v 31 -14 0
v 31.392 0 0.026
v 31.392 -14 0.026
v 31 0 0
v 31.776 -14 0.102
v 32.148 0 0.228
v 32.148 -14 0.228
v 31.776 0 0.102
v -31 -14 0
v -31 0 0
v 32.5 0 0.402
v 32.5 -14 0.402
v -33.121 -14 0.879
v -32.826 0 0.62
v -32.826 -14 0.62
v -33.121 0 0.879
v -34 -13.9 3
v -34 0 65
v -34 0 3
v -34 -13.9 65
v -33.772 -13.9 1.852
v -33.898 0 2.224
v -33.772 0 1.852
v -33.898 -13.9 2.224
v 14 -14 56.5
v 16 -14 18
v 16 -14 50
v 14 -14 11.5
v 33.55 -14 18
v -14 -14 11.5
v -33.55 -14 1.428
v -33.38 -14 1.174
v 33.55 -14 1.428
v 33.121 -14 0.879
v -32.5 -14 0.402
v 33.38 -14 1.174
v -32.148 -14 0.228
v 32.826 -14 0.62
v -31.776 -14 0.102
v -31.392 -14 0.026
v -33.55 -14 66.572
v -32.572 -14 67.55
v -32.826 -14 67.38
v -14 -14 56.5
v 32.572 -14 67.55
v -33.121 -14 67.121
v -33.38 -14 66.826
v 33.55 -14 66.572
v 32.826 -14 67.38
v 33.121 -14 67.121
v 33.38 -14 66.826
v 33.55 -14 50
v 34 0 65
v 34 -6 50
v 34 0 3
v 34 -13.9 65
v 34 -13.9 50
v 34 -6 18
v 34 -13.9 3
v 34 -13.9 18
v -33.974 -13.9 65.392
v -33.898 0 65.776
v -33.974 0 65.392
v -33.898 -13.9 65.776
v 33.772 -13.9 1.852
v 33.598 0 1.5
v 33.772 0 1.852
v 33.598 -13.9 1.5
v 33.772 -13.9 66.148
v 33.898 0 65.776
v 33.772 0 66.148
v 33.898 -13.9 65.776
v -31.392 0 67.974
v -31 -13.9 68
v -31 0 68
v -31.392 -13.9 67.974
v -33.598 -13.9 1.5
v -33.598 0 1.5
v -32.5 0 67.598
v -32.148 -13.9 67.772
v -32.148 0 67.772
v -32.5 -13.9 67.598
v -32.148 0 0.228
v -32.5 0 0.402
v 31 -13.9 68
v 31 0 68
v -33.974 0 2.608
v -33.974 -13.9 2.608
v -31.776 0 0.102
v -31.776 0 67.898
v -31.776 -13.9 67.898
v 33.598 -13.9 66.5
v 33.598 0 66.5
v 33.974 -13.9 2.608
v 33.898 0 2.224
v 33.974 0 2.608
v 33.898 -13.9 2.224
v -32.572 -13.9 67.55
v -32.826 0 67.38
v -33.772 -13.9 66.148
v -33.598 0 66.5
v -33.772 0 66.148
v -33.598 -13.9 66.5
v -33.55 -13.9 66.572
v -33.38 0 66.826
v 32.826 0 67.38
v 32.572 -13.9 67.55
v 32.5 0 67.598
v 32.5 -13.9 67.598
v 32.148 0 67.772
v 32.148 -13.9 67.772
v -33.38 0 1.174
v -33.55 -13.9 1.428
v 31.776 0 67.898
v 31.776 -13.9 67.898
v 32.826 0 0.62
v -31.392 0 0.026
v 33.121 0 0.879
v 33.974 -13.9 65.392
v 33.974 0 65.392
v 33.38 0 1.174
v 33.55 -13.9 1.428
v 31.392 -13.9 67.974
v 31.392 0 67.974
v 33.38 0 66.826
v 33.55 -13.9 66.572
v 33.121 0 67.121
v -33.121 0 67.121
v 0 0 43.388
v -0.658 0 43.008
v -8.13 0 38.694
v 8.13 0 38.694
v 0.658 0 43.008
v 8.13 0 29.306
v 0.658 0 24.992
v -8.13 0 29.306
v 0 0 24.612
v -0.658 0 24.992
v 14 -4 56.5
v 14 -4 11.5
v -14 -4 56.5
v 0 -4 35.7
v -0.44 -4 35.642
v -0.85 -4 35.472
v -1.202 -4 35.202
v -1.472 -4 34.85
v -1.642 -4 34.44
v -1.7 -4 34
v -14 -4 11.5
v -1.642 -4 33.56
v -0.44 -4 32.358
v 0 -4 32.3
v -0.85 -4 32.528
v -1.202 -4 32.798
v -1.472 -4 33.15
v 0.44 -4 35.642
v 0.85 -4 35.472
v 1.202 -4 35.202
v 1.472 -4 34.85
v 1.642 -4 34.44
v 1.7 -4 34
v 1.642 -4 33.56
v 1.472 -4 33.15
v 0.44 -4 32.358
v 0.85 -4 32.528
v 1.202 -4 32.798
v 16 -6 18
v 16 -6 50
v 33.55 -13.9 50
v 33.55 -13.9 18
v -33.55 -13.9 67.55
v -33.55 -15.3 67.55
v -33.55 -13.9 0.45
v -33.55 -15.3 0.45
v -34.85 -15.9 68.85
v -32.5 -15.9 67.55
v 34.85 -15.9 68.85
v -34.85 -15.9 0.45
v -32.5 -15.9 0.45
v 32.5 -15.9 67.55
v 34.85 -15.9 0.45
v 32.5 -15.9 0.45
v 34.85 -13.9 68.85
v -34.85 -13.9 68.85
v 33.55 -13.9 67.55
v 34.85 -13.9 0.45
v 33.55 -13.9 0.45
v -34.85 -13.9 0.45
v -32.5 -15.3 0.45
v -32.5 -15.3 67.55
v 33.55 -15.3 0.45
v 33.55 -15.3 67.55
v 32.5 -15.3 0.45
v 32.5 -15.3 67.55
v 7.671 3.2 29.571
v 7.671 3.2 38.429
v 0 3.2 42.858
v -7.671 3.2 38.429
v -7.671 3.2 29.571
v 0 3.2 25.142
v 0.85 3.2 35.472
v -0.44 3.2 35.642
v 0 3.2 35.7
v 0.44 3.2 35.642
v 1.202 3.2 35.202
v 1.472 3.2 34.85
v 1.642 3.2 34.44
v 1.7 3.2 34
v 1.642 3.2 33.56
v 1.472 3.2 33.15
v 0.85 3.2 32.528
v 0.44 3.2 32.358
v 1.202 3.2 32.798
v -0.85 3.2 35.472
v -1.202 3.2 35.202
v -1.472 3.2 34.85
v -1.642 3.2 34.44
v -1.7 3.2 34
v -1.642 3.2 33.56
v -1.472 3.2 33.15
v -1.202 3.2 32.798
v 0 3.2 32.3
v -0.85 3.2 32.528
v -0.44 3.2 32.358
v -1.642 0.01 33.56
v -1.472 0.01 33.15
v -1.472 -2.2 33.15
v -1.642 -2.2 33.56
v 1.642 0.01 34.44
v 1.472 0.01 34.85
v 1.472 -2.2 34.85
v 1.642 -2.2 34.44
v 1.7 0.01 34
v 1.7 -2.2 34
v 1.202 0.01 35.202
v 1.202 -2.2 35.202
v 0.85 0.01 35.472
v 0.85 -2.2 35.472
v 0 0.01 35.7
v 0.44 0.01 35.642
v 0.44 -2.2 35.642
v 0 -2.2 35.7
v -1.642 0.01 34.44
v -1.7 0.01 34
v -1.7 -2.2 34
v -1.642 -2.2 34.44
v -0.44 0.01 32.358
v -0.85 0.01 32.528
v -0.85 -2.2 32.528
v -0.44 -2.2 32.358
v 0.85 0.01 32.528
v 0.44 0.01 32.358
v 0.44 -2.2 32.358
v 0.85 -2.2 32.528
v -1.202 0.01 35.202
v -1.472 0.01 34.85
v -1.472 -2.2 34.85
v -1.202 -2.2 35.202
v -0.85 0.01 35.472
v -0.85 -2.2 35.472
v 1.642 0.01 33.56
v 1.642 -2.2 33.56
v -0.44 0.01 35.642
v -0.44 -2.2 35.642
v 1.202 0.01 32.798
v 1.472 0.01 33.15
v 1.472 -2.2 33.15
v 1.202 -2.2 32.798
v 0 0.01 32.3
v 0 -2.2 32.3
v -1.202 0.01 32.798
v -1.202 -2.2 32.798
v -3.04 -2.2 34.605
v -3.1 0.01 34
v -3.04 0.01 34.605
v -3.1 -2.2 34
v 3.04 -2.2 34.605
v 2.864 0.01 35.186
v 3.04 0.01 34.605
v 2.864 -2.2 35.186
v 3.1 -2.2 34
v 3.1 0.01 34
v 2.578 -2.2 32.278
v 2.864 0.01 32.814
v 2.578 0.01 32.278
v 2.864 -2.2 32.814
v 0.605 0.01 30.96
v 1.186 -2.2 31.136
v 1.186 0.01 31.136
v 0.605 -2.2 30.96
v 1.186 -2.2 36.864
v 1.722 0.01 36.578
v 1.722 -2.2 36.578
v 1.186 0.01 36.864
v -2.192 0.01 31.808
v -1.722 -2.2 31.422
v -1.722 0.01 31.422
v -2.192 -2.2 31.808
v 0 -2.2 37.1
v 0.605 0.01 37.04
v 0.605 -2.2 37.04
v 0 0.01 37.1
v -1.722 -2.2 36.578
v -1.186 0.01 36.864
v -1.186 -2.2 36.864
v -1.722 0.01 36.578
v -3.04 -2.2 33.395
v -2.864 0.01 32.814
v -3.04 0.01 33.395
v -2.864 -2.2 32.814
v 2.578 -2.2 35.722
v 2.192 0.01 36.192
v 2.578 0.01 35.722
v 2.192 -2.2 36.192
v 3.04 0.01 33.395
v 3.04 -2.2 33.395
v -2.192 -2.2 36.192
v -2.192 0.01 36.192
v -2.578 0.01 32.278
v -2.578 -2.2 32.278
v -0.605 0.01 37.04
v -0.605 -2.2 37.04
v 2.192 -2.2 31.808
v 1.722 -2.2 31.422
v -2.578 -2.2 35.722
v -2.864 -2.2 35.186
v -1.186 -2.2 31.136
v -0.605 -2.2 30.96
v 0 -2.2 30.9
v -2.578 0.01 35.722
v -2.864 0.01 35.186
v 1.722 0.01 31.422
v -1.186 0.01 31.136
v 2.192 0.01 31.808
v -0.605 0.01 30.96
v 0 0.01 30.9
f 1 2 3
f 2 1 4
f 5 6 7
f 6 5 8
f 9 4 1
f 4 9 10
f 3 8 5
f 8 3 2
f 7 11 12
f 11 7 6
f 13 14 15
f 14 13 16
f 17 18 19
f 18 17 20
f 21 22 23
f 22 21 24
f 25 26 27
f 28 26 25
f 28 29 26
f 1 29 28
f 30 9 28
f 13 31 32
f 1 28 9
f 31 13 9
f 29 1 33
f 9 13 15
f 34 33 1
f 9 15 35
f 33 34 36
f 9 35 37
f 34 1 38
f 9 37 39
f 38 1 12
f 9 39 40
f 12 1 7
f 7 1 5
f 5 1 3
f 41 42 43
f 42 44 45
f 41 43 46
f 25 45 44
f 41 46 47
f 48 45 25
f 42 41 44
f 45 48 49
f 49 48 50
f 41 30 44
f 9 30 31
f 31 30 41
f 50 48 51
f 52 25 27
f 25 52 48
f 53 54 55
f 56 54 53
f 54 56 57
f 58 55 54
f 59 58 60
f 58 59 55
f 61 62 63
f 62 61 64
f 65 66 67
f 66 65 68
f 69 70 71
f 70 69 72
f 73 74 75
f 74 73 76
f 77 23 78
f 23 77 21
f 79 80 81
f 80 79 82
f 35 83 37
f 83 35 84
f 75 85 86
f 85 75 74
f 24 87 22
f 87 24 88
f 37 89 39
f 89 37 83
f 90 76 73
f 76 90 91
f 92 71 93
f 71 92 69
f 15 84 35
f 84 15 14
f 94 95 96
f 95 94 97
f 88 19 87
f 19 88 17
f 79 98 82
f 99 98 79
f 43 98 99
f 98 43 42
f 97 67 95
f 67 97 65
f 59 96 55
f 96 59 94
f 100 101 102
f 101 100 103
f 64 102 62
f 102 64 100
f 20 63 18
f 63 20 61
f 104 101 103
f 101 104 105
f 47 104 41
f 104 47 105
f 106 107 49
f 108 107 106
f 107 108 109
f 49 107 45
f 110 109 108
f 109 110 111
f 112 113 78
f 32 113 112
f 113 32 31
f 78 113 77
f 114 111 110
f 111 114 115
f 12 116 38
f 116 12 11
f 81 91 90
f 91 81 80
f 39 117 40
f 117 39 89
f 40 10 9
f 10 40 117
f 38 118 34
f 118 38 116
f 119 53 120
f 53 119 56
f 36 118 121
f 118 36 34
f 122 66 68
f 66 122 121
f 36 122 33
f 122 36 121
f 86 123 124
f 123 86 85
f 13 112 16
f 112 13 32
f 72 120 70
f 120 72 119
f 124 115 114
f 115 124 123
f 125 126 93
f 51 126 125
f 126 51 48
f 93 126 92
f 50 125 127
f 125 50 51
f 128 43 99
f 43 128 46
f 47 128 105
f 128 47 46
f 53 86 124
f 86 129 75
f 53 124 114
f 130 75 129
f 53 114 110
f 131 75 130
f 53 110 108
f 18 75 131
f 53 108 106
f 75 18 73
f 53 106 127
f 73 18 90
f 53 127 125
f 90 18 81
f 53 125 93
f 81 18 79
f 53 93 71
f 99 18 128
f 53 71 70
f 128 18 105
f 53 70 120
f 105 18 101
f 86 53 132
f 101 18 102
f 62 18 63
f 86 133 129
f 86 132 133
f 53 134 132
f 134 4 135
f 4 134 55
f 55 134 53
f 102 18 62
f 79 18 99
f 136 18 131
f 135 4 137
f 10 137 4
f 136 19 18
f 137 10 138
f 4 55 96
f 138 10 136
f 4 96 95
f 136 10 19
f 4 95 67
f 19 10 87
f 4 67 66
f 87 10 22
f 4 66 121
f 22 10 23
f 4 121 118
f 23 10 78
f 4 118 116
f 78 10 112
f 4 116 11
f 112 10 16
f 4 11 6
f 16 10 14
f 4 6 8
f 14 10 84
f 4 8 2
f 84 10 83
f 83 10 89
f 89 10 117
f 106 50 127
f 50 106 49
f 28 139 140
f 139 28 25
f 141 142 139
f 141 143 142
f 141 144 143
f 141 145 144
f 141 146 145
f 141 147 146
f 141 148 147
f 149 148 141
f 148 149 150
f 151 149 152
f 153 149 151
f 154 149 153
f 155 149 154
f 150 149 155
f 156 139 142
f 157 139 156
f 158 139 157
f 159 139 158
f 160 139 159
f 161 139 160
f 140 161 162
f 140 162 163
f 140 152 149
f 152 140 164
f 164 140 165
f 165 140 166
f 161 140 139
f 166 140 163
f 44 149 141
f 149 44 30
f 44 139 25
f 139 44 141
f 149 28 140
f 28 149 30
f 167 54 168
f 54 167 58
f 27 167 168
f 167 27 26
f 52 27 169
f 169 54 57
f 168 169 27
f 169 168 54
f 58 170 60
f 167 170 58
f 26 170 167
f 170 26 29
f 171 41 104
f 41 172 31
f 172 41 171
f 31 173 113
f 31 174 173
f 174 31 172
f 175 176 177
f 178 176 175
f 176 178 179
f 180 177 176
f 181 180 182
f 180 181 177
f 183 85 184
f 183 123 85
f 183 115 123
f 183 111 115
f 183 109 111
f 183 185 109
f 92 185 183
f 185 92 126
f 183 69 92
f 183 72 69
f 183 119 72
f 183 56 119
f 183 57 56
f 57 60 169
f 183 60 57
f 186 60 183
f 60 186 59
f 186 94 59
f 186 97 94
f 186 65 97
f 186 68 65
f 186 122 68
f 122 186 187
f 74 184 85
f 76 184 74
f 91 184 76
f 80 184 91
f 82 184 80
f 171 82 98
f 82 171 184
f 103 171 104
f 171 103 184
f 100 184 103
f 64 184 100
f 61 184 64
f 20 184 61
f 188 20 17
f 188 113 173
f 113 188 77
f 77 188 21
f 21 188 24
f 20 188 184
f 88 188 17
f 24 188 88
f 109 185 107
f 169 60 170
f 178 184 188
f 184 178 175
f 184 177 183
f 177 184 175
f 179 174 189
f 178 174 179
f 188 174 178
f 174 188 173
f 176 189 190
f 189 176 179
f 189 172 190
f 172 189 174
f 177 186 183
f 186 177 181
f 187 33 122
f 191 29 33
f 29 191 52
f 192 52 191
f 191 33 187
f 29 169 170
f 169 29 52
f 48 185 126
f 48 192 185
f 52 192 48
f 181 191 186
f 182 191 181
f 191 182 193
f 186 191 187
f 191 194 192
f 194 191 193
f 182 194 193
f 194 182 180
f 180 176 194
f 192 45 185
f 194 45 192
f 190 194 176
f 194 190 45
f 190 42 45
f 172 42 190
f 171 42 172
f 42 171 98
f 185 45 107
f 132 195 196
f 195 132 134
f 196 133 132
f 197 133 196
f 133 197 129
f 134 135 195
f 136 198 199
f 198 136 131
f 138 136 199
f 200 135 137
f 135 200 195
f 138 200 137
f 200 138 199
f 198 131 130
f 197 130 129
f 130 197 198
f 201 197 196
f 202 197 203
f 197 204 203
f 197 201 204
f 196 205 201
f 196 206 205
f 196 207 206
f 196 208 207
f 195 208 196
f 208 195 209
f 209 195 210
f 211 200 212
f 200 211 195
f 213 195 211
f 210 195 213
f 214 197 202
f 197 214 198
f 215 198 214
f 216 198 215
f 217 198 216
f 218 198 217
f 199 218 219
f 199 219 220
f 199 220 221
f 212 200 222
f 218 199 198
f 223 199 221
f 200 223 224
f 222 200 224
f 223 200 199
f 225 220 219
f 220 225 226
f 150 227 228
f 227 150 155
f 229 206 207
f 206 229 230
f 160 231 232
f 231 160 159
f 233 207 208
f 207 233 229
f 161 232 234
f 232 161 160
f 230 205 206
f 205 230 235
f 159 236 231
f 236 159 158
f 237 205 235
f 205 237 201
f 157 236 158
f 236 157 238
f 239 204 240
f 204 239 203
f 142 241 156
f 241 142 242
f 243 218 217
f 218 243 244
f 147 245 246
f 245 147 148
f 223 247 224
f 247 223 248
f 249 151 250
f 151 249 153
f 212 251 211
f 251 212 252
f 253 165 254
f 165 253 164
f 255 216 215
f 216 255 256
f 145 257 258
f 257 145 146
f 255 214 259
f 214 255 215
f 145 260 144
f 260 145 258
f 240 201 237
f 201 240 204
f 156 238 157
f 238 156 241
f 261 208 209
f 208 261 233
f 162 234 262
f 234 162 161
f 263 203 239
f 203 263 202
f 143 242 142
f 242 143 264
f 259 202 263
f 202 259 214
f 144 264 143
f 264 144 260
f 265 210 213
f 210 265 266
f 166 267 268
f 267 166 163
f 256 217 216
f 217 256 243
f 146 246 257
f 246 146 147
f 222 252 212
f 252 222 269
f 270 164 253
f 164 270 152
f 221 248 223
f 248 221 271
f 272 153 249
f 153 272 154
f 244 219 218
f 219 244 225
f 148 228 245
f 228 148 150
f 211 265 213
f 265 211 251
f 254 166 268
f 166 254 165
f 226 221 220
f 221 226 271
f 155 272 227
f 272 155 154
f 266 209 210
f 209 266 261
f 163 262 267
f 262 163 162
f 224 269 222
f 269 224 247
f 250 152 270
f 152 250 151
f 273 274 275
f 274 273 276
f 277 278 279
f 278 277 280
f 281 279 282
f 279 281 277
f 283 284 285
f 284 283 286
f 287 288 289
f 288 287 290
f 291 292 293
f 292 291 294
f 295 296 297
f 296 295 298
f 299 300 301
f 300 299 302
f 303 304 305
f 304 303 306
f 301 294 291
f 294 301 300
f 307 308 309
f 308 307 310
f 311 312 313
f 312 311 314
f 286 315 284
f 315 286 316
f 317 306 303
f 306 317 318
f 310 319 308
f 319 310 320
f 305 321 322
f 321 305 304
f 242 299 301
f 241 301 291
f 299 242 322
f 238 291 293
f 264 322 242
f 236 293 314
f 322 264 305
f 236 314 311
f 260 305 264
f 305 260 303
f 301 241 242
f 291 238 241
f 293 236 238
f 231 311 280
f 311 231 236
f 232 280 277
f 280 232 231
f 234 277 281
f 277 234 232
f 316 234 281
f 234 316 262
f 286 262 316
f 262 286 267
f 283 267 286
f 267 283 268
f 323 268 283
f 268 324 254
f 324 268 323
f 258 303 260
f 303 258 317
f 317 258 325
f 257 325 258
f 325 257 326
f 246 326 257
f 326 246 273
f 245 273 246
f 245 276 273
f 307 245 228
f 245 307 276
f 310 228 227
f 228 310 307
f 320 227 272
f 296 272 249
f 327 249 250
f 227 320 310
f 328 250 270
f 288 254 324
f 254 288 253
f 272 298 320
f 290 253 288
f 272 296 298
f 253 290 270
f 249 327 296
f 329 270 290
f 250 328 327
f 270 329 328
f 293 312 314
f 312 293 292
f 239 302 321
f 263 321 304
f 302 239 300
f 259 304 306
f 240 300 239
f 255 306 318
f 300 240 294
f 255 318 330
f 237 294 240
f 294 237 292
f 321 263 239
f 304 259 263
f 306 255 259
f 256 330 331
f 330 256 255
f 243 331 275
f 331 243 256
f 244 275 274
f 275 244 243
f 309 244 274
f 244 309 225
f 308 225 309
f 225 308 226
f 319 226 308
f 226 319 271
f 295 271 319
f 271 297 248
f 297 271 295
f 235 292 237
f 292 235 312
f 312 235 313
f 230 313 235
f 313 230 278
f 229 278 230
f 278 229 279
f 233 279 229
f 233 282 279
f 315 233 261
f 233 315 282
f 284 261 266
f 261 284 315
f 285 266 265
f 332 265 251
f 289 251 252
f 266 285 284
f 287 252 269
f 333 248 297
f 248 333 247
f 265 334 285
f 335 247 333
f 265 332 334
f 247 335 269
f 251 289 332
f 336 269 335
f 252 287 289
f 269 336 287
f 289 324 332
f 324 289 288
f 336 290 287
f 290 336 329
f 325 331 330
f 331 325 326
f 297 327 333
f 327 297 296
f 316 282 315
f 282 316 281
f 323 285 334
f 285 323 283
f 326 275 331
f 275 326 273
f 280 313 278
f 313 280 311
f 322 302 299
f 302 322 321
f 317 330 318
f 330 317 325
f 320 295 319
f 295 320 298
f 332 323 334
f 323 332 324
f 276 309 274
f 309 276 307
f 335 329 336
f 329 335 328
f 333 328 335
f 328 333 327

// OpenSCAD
// file: rm_common.scad
// RobotMind V1 mechanical standard. All dimensions are millimetres.
$fn = 48;

RM_UNIT = 40;
RM_PLATE_T = 12;
RM_FIT = 0; // positive is looser; tune in 0.05 mm steps

// One carrier joint: a progressive hex press fit plus an optional M3 lock.
RM_SOCKET_DEPTH = 3.4;
RM_HEX_AF = 16;
RM_HEX_R = RM_HEX_AF/sqrt(3);
RM_HEX_TAPER = 0.28;
RM_HEX_ENTRY_CLEARANCE = 0.10+RM_FIT;
RM_HEX_GRIP = 0.20-RM_FIT;
RM_HEX_PITCH = 20;
RM_HEX_X = RM_HEX_PITCH;
RM_HEX_Y = sqrt(3)/2*RM_HEX_PITCH;

// Plate-to-plate 90° box joint: integral tabs enter open edge slots.
RM_JOIN_PITCH = 10;
RM_JOIN_LENGTH = 3.0;
RM_JOIN_W = 6;
RM_JOIN_CLEARANCE = 0.06+RM_FIT;
RM_M3_CLEARANCE = 3.4;
RM_M3_PILOT = 2.6;
RM_M3_HEAD = 6.2;
RM_M3_INSERT_HOLE = 4.0; // tune for the chosen M3 heat-set insert
RM_M3_INSERT_LENGTH = 5.0;
RM_M3_MEMBRANE = 0.3;
RM_M3_BLIND_DEPTH =
  (RM_PLATE_T-2*RM_SOCKET_DEPTH-RM_M3_MEMBRANE)/2;

assert(RM_PLATE_T > 2 * RM_SOCKET_DEPTH,
       "Plate needs a solid web between its two carrier sockets");
assert(RM_HEX_ENTRY_CLEARANCE >= 0 && RM_HEX_GRIP > 0 &&
       RM_JOIN_CLEARANCE >= 0,
       "RM_FIT is outside the printable range");
assert(RM_M3_BLIND_DEPTH > 0,
       "Plate is too thin for double-sided M3 insert pockets");
assert(2*RM_M3_BLIND_DEPTH+RM_M3_MEMBRANE >= RM_M3_INSERT_LENGTH,
       "Plate web is too thin for the M3 insert");

module rounded_box(size=[20,20,3], r=2, center=false) {
  x=size[0]; y=size[1]; z=size[2];
  translate(center ? [-x/2,-y/2,-z/2] : [0,0,0])
    linear_extrude(height=z)
      offset(r=r) offset(delta=-r) square([x,y]);
}

module print_on_x_edge(span) {
  translate([0,0,span/2]) rotate([0,90,0]) children();
}

module print_on_y_edge(span) {
  translate([0,0,span/2]) rotate([90,0,0]) children();
}

module hex_frustum(r1=RM_HEX_R, r2=RM_HEX_R, h=1) {
  rotate([0,0,30]) cylinder(r1=r1,r2=r2,h=h,$fn=6);
}

module top_socket_cut() {
  union() {
    translate([0,0,RM_PLATE_T-RM_SOCKET_DEPTH])
      hex_frustum(RM_HEX_R-RM_HEX_TAPER,
                   RM_HEX_R,
                   RM_SOCKET_DEPTH+0.1);
    translate([0,0,RM_PLATE_T-RM_SOCKET_DEPTH-RM_M3_BLIND_DEPTH])
      cylinder(h=RM_M3_BLIND_DEPTH+0.1,d=RM_M3_INSERT_HOLE,$fn=24);
  }
}

module bottom_socket_cut() {
  union() {
    translate([0,0,-0.1])
      hex_frustum(RM_HEX_R,
                   RM_HEX_R-RM_HEX_TAPER,
                   RM_SOCKET_DEPTH+0.1);
    translate([0,0,RM_SOCKET_DEPTH-0.1])
      cylinder(h=RM_M3_BLIND_DEPTH+0.1,d=RM_M3_INSERT_HOLE,$fn=24);
  }
}

module socket_pair() {
  top_socket_cut();
  bottom_socket_cut();
}

// Triangular lattice. Female edges reserve enough material for corner slots;
// the 5.5 mm origin shift keeps the 20 mm pitch and centers the usable area.
module dense_socket_grid(size=[2*RM_UNIT,2*RM_UNIT]) {
  rows=ceil(size[1]/RM_HEX_Y)+2;
  cols=ceil(size[0]/RM_HEX_X)+2;
  female_margin=RM_PLATE_T+1;
  male_margin=2;
  origin=(female_margin-male_margin)/2;
  for(row=[-rows:rows], col=[-cols:cols]) {
    y=origin+row*RM_HEX_Y;
    x=origin+(col + ((abs(row)%2)==1 ? 0.5 : 0))*RM_HEX_X;
    if(x-RM_HEX_AF/2 >= -size[0]/2+female_margin &&
       x+RM_HEX_AF/2 <= size[0]/2-male_margin &&
       y-RM_HEX_R >= -size[1]/2+female_margin &&
       y+RM_HEX_R <= size[1]/2-male_margin)
      translate([x,y,0]) socket_pair();
  }
}

function join_index(p,edge_len) =
  round((p+edge_len/2-RM_JOIN_PITCH/2)/RM_JOIN_PITCH);
function is_m3_join(p,edge_len) = join_index(p,edge_len)%4 == 1;

// Integral rectangular tabs on an A edge (+Y in local coordinates).
module male_edge(edge_len, plate_half) {
  for(p=[-edge_len/2+RM_JOIN_PITCH/2:
         RM_JOIN_PITCH:
         edge_len/2-RM_JOIN_PITCH/2])
    translate([p-RM_JOIN_W/2,plate_half-0.05,0])
      cube([RM_JOIN_W,RM_JOIN_LENGTH+0.05,RM_PLATE_T]);
}

// Blind thread-forming pilots continue through selected tabs into the edge.
module male_edge_m3_cuts(edge_len, plate_half) {
  for(p=[-edge_len/2+RM_JOIN_PITCH/2:
         RM_JOIN_PITCH:
         edge_len/2-RM_JOIN_PITCH/2])
    if(is_m3_join(p,edge_len))
      translate([p,plate_half-4,RM_PLATE_T/2])
        rotate([-90,0,0])
          cylinder(h=RM_JOIN_LENGTH+4.2,d=RM_M3_PILOT,$fn=24);
}

// Female B edge (-Y): open slots accept tabs from either face at 90°.
module female_edge_cuts(edge_len, plate_half) {
  for(p=[-edge_len/2+RM_JOIN_PITCH/2:
         RM_JOIN_PITCH:
         edge_len/2-RM_JOIN_PITCH/2]) {
    translate([p-RM_JOIN_W/2-RM_JOIN_CLEARANCE,
               -plate_half-0.1,-0.1])
      cube([RM_JOIN_W+2*RM_JOIN_CLEARANCE,
            RM_PLATE_T+RM_JOIN_CLEARANCE,
            RM_JOIN_LENGTH+0.1]);
    translate([p-RM_JOIN_W/2-RM_JOIN_CLEARANCE,
               -plate_half-0.1,RM_PLATE_T-RM_JOIN_LENGTH])
      cube([RM_JOIN_W+2*RM_JOIN_CLEARANCE,
            RM_PLATE_T+RM_JOIN_CLEARANCE,
            RM_JOIN_LENGTH+0.1]);
    if(is_m3_join(p,edge_len)) {
      translate([p,-plate_half+RM_PLATE_T/2,-0.1])
        cylinder(h=RM_PLATE_T+0.2,d=RM_M3_CLEARANCE,$fn=24);
    }
  }
}

// Identical plates: tabs on +X/+Y and 90° slots on -X/-Y.
module plate(size=[2*RM_UNIT,2*RM_UNIT]) {
  assert(size[0] % RM_UNIT == 0 && size[1] % RM_UNIT == 0,
         "Plate dimensions must be whole 40 mm units");
  difference() {
    union() {
      translate([-size[0]/2,-size[1]/2,0])
        rounded_box([size[0],size[1],RM_PLATE_T],1.5);
      male_edge(size[0],size[1]/2);
      rotate([0,0,-90]) male_edge(size[1],size[0]/2);
    }
    dense_socket_grid(size);
    female_edge_cuts(size[0],size[1]/2);
    rotate([0,0,-90]) female_edge_cuts(size[1],size[0]/2);
    male_edge_m3_cuts(size[0],size[1]/2);
    rotate([0,0,-90]) male_edge_m3_cuts(size[1],size[0]/2);
  }
}

// The tip enters freely; the last fraction of travel supplies the grip.
module integral_hex_plug() {
  translate([0,0,-RM_SOCKET_DEPTH+0.2])
    hex_frustum(RM_HEX_R-RM_HEX_TAPER-RM_HEX_ENTRY_CLEARANCE,
                 RM_HEX_R+RM_HEX_GRIP,
                 RM_SOCKET_DEPTH+0.1);
}

// Adds the universal plug. M3 is optional: the press fit works alone.
module carrier_mount() {
  difference() {
    union() {
      children();
      integral_hex_plug();
    }
    translate([0,0,-RM_SOCKET_DEPTH])
      cylinder(h=RM_SOCKET_DEPTH+100,d=RM_M3_CLEARANCE,$fn=24);
    translate([0,0,-0.01])
      cylinder(h=2.21,d=RM_M3_HEAD,$fn=32);
  }
}

module sensor_carrier(pcb=[20,20], wall=1.7, floor=1.8, clearance=0.5) {
  W=pcb[0]+2*(wall+clearance);
  L=pcb[1]+2*(wall+clearance);
  assert(W >= 2*(RM_HEX_R+RM_HEX_GRIP),
         "Carrier is narrower than its integral hex plug");
  carrier_mount() union() {
    translate([-W/2,-L/2,0]) difference() {
      rounded_box([W,L,floor+3.1],2);
      translate([wall,wall,floor])
        rounded_box([pcb[0]+2*clearance,pcb[1]+2*clearance,5],1);
      translate([W/2-6,-0.2,floor+0.5]) cube([12,wall+1,3.5]);
    }
    for(x=[-W/2+2.2,W/2-2.2], y=[-L/2+2.2,L/2-2.2])
      translate([x,y,floor+2.5]) cylinder(h=1.3,d=2.2);
  }
}

module tag_insert(tag=[60,60], border=3, t=1) {
  W=tag[0]+2*border; H=tag[1]+2*border;
  union() {
    translate([-W/2,-H/2,0]) rounded_box([W,H,t],1.2);
    translate([-8,-H/2-4,0]) rounded_box([16,5,t],1.2);
  }
}

module tag_insert_rails(tag=[60,60], border=4, rail=1.5,
                        depth=2.2, clearance=0.25, lip=0.8, lip_t=0.6) {
  W=tag[0]+2*border; H=tag[1]+2*border;
  for(sx=[-1,1]) {
    x=sx>0 ? W/2+clearance : -W/2-clearance-rail;
    translate([x,-H/2-clearance,0])
      cube([rail,H+2*clearance+rail,depth]);
    translate([sx>0 ? W/2-lip : -W/2-clearance-rail,
               -H/2-clearance,depth-lip_t])
      cube([rail+clearance+lip,H+2*clearance+rail,lip_t]);
  }
  translate([-W/2-clearance-rail,H/2+clearance,0])
    cube([W+2*(clearance+rail),rail,depth]);
}
// main file
include <rm_common.scad>

TAG=60;
PCB=[28,45,8]; // provisional beacon PCB envelope; measure before final print
W=max(TAG+8,PCB[0]+8);
H=max(TAG+8,PCB[1]+8);
D=14;

module apriltag_beacon_carrier() {
  carrier_mount() union() {
    difference() {
      translate([-W/2,-H/2,0]) rounded_box([W,H,D],3);
      translate([-PCB[0]/2,-PCB[1]/2,4]) cube([PCB[0],PCB[1],D+1]);
      translate([W/2-18,-16,6]) cube([20,32,D]);
    }
    translate([0,0,D-0.1])
      tag_insert_rails([TAG,TAG],border=3.3,rail=1.3,depth=2.0);
  }
}

print_on_y_edge(H) apriltag_beacon_carrier();
